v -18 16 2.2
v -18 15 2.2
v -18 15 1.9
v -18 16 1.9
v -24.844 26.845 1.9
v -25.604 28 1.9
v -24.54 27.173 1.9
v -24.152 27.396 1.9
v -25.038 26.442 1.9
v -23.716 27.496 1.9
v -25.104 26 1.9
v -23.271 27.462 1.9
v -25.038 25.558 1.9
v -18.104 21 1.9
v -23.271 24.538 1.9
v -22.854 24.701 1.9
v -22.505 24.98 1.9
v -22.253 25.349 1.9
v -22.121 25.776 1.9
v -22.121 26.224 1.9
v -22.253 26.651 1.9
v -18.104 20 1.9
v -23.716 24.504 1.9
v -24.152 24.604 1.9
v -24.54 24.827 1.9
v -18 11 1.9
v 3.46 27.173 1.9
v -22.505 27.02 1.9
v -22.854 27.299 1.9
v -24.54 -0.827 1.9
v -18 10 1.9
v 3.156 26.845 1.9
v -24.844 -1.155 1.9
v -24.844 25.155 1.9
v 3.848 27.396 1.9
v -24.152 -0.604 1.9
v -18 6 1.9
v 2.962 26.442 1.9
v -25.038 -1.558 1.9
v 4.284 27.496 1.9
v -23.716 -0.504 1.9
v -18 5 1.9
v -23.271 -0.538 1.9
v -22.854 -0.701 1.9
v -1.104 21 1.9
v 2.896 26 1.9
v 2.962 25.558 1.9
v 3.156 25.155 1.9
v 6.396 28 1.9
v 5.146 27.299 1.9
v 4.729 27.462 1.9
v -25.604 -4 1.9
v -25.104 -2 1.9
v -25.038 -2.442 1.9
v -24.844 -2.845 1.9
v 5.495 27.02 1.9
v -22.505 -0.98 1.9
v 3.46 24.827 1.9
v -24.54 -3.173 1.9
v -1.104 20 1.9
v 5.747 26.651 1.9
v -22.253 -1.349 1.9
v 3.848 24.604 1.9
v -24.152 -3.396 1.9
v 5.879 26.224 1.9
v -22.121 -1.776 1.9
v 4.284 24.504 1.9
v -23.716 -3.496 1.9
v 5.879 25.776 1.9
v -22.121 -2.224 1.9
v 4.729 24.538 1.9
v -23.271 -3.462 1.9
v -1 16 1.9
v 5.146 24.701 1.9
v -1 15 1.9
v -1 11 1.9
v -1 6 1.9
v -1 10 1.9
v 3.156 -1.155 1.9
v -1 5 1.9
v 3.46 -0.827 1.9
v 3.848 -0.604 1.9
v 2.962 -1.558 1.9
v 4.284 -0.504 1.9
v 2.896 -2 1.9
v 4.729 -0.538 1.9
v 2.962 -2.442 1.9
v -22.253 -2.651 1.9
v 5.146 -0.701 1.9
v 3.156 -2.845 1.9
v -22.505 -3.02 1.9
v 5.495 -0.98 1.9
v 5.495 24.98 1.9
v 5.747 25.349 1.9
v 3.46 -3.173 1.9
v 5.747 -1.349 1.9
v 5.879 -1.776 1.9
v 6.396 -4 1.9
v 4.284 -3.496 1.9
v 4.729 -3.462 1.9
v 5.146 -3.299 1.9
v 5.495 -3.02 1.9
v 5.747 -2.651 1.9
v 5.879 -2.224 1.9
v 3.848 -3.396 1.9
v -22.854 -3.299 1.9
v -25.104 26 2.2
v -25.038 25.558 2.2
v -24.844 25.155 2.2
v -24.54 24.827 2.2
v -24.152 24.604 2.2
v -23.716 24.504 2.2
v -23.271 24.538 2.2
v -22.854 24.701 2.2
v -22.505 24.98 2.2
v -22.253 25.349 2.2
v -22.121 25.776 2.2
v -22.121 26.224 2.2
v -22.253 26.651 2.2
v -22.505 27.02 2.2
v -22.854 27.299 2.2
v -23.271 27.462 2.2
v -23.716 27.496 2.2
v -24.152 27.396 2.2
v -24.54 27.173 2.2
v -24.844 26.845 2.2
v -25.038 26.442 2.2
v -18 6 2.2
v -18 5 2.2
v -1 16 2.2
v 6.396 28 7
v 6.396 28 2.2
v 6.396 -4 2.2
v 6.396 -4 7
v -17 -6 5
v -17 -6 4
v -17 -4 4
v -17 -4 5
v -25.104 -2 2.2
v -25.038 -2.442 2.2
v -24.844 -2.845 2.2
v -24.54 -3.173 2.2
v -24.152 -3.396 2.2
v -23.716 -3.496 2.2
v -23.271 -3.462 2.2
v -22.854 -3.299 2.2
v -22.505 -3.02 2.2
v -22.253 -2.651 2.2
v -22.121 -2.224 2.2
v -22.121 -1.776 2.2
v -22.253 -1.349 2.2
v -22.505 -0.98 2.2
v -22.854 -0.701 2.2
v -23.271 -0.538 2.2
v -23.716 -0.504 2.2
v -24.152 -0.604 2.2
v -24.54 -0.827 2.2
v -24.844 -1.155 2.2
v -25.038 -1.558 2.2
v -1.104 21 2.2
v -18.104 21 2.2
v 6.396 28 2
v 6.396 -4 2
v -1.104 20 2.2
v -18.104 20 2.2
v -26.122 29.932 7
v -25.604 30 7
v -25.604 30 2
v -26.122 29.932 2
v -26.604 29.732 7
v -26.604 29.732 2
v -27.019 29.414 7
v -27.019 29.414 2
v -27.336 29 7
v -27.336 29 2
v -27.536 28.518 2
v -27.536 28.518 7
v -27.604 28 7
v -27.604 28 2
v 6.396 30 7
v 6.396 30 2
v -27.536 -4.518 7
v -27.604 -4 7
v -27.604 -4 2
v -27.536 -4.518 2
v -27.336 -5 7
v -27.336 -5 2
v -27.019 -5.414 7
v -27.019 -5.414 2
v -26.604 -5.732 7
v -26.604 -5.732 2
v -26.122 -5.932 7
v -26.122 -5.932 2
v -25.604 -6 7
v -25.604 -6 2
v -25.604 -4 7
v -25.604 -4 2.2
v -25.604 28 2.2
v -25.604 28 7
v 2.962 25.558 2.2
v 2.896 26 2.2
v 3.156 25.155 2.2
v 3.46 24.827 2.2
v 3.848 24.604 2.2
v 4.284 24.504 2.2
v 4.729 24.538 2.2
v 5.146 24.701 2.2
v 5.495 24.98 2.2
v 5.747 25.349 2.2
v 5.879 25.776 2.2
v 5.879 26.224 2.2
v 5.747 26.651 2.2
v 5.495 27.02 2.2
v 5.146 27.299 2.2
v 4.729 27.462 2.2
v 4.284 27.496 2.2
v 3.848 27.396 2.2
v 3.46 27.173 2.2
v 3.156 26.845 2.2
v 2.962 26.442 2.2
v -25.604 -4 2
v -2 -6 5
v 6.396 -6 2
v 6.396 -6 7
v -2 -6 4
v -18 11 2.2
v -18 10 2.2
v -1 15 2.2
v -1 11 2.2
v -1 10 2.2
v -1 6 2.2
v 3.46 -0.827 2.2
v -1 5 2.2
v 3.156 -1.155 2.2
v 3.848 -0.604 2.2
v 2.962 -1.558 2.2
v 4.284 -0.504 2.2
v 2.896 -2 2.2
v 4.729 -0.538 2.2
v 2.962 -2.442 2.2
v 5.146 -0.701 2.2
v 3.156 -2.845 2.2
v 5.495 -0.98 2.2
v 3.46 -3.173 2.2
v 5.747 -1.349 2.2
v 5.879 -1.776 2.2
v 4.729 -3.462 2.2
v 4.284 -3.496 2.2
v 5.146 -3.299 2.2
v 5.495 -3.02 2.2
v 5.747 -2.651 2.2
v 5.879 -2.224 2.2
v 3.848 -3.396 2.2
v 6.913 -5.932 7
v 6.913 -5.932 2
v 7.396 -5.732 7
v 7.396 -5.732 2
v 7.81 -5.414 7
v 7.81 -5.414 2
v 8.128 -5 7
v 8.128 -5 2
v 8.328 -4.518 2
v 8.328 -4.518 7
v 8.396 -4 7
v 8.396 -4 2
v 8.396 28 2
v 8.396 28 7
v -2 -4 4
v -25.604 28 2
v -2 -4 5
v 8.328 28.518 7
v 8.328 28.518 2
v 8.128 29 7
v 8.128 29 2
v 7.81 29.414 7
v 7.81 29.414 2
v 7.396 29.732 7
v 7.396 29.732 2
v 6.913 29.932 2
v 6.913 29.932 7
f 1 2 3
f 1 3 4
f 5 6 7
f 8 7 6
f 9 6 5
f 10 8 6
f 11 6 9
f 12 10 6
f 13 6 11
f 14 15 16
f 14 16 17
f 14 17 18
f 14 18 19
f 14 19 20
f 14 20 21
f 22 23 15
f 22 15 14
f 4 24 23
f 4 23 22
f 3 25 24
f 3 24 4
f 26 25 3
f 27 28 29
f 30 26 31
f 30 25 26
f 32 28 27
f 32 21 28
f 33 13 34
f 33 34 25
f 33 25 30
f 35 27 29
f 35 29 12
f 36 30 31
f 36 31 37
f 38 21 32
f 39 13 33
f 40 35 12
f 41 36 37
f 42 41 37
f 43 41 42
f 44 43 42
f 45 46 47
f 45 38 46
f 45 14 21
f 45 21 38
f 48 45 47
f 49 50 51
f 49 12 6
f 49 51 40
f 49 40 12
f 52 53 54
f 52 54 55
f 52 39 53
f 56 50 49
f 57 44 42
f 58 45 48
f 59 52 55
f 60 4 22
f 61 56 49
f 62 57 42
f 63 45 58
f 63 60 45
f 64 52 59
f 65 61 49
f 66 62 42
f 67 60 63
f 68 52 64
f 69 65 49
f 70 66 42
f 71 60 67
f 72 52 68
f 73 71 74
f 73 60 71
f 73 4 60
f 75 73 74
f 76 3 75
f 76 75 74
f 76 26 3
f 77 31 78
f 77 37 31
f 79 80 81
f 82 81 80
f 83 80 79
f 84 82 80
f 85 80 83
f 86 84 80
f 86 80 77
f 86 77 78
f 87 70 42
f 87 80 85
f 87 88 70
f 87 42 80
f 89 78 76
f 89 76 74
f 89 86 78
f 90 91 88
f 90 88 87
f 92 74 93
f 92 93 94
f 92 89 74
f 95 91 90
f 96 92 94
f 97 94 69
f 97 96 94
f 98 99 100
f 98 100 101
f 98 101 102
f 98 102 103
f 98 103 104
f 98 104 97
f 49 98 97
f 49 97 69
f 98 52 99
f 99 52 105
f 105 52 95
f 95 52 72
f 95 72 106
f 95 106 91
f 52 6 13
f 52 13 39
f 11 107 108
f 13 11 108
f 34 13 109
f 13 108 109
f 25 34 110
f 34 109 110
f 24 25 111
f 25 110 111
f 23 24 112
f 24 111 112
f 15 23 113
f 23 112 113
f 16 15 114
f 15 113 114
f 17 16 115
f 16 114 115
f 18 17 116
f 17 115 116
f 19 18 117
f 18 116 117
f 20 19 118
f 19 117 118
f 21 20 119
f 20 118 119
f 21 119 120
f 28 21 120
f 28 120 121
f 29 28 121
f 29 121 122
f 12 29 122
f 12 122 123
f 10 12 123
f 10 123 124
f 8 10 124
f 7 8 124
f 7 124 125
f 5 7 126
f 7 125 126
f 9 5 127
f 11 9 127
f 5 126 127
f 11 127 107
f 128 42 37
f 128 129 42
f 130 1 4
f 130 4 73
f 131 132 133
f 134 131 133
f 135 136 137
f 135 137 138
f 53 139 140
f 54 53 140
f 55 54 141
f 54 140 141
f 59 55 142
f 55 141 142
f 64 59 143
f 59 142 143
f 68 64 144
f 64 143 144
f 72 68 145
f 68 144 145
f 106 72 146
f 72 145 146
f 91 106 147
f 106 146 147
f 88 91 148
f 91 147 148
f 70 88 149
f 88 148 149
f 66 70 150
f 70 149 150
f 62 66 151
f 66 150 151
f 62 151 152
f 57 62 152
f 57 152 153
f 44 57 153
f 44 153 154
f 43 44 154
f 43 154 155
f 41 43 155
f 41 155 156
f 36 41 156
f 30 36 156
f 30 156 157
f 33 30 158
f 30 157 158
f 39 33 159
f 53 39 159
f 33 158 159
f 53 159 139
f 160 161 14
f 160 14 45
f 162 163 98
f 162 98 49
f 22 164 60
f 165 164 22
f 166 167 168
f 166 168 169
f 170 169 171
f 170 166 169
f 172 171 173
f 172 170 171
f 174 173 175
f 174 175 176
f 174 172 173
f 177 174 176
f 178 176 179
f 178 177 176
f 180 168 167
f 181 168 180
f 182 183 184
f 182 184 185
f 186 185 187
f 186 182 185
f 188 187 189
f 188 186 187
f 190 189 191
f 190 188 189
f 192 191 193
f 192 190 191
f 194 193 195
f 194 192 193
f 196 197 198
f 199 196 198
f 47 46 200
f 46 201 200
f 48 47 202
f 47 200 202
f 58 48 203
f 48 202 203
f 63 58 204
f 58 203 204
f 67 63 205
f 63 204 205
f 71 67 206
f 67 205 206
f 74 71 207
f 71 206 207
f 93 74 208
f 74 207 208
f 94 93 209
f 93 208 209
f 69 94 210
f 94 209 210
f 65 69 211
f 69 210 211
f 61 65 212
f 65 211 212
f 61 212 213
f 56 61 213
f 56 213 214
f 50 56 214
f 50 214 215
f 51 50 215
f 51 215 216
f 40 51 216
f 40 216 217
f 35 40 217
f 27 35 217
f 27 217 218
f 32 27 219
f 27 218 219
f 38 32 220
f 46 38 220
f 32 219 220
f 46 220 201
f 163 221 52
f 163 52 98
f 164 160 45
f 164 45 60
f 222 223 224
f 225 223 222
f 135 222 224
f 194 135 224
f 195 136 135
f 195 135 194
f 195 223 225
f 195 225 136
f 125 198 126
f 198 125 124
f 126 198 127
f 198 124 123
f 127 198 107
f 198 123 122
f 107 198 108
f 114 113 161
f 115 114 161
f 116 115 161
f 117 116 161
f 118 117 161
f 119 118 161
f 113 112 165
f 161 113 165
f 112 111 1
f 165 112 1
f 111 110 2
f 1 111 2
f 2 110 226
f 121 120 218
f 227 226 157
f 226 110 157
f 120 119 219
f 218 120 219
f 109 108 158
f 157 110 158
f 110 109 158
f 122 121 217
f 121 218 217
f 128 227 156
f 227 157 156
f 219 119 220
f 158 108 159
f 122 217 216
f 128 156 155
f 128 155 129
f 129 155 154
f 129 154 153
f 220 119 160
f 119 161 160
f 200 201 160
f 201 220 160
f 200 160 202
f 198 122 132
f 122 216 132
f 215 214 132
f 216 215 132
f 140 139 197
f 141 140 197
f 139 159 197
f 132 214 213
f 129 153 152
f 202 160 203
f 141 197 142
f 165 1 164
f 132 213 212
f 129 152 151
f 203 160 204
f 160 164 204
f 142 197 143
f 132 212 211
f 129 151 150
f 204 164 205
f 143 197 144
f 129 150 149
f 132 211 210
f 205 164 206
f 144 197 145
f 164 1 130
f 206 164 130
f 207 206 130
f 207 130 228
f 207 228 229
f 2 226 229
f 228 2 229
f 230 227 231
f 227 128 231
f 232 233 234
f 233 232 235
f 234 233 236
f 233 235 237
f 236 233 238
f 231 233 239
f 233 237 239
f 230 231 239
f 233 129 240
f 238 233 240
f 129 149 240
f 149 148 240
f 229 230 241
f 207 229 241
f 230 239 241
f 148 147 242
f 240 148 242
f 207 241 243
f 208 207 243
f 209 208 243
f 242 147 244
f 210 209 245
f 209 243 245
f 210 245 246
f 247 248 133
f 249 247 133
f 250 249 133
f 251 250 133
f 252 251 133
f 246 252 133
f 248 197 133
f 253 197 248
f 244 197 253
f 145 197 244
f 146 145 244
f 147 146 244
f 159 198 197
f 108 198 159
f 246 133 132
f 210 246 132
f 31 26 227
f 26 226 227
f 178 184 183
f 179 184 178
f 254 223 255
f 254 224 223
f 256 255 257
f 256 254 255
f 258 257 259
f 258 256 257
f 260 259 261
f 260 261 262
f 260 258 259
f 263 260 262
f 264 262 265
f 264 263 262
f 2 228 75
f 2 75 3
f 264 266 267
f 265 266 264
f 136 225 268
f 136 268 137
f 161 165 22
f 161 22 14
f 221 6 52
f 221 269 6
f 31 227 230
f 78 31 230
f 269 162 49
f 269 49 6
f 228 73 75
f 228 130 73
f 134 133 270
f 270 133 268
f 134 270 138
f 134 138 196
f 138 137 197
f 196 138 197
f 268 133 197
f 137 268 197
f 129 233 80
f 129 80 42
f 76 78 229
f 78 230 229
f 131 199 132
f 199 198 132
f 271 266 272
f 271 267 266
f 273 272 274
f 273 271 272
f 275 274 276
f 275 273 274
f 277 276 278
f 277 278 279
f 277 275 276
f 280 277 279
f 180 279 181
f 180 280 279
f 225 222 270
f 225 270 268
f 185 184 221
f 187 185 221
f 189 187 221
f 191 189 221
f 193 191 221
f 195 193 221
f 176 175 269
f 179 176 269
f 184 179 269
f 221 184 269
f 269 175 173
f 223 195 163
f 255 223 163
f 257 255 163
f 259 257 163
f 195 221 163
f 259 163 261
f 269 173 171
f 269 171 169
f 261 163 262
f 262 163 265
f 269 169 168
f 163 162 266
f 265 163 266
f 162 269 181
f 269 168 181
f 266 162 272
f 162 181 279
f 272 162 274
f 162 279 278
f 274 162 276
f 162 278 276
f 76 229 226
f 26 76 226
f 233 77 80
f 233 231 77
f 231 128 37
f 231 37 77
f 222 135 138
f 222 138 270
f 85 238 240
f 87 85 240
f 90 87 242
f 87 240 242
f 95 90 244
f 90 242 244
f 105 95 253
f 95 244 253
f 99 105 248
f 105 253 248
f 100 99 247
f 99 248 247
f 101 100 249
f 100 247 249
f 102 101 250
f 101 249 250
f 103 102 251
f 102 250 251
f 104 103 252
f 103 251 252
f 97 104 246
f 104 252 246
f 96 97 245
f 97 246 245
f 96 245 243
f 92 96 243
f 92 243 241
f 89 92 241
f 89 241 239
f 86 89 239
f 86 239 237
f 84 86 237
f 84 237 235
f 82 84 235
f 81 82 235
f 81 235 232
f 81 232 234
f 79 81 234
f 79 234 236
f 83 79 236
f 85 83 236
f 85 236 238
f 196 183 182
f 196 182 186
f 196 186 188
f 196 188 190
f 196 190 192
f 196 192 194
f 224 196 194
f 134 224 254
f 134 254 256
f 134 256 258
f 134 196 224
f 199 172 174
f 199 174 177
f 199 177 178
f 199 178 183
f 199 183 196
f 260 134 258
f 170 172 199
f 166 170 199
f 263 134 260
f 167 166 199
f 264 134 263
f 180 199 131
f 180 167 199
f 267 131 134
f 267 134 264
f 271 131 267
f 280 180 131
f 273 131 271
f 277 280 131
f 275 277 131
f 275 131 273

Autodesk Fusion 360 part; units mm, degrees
sketch "Sketch1" plane through (0, 0, 0) normal (0, 0, 1) x (1, 0, 0)
  line L0 (-27.6043, 30) -> (8.3957, 30)
  line L1 (8.3957, 30) -> (8.3957, -6)
  line L2 (8.3957, -6) -> (-27.6043, -6)
  line L3 (-27.6043, -6) -> (-27.6043, 30)
  line L4 (-25.6043, 28) -> (6.3957, 28)
  line L5 (6.3957, 28) -> (6.3957, -4)
  line L6 (6.3957, -4) -> (-25.6043, -4)
  line L7 (-25.6043, -4) -> (-25.6043, 28)
  dimension "d1" = 36
  dimension "d2" = 36
  dimension "d3" = 32
  dimension "d4" = 32
  dimension "d5" = 2
  dimension "d6" = 2
extrude "Extrude1" add sketch "Sketch1" along normal blind 5 from surface at 2 makes body 1
sketch "Sketch2" plane through (0, 0, 2) normal (0, 0, -1) x (1, 0, 0)
  line L0 (-25.6043, 4) -> (6.3957, 4)
  line L1 (6.3957, 4) -> (6.3957, -28)
  line L2 (6.3957, -28) -> (-25.6043, -28)
  line L3 (-25.6043, -28) -> (-25.6043, 4)
  line L4 (8.3957, 6) -> (-27.6043, 6)
  line L5 (-27.6043, 6) -> (-27.6043, -30)
  line L6 (-27.6043, -30) -> (8.3957, -30)
  line L7 (8.3957, -30) -> (8.3957, 6)
extrude "Extrude2" add sketch "Sketch2" along normal blind 0.2 separate body contours L0 L1 L2 L3 makes body 2
move_body "Move1" bodies 2 to x (1, 0, 0) y (0, 1, 0) z (0, 0, 1) at (0, 0, 0.2)
fillet "Fillet1" radius 2 1 edges at (-27.6043, 30, 4.5) on bodies 1
fillet "Fillet2" radius 2 1 edges at (-27.6043, -6, 4.5) on bodies 1
fillet "Fillet3" radius 2 1 edges at (8.3957, -6, 4.5) on bodies 1
fillet "Fillet4" radius 2 1 edges at (8.3957, 30, 4.5) on bodies 1
extrude "Extrude3" add 1 faces at (-14.9376, 17.3333, 2) along direction (0, 0, -1) blind 0.1 on bodies 2 bodies 1 2
sketch "Sketch3" plane through (0, 0, 2.2) normal (0, 0, 1) x (-1, 0, 0)
  line L0 (-6.3957, -28) -> (25.6043, -28)
  line L1 (25.6043, -28) -> (25.6043, 4)
  line L2 (25.6043, 4) -> (-6.3957, 4)
  line L3 (-6.3957, 4) -> (-6.3957, -28)
  circle A0 centre (23.6043, 2) radius 1.5
  circle A1 centre (23.6043, 2) radius 2
  circle A2 centre (-4.3957, 2) radius 1.5
  circle A3 centre (-4.3957, 2) radius 2
  circle A4 centre (-4.3957, -26) radius 1.5
  circle A5 centre (-4.3957, -26) radius 2
  circle A6 centre (23.6043, -26) radius 1.5
  circle A7 centre (23.6043, -26) radius 2
  dimension "d22" = 3
  dimension "d23" = 4
  dimension "d24" = 3
  dimension "d25" = 4
  dimension "d26" = 3
  dimension "d27" = 4
  dimension "d28" = 3
  dimension "d29" = 4
extrude "Extrude4" cut sketch "Sketch3" against normal blind 0.4 contours A2 bodies 1
extrude "Extrude5" cut sketch "Sketch3" against normal blind 4 contours A0 bodies 1
extrude "Extrude6" cut sketch "Sketch3" against normal blind 4 contours A6 bodies 1
extrude "Extrude7" cut sketch "Sketch3" against normal blind 4 contours A4 bodies 1
sketch "Sketch4" plane through (0, -6, 0) normal (0, -1, 0) x (1, 0, 0)
  line L0 (6.3957, 2) -> (6.3957, 7)
  line L1 (6.3957, 7) -> (-25.6043, 7)
  line L2 (-25.6043, 7) -> (-25.6043, 2)
  line L3 (-25.6043, 2) -> (6.3957, 2)
  line L4 (-17, 5) -> (-2, 5)
  line L5 (-2, 5) -> (-2, 4)
  line L6 (-2, 4) -> (-17, 4)
  line L7 (-17, 4) -> (-17, 5)
extrude "Extrude8" cut sketch "Sketch4" against normal blind 5 contours L4 L5 L6 L7 bodies 1
sketch "Sketch5" plane through (0, 0, 2.2) normal (0, 0, 1) x (-1, 0, 0)
  circle A0 centre (-4.3957, -26) radius 1.5
  circle A1 centre (23.6043, -26) radius 1.5
  circle A2 centre (23.6043, 2) radius 1.5
  circle A3 centre (-4.3957, 2) radius 1.5
  line L0 (-6.3957, -28) -> (25.6043, -28)
  line L1 (25.6043, -28) -> (25.6043, 4)
  line L2 (25.6043, 4) -> (-6.3957, 4)
  line L3 (-6.3957, 4) -> (-6.3957, -28)
  line L4 (18, -16) -> (1, -16)
  line L5 (1, -16) -> (1, -15)
  line L6 (1, -15) -> (18, -15)
  line L7 (18, -15) -> (18, -16)
  line L8 (1, -11) -> (18, -11)
  line L9 (18, -11) -> (18, -10)
  line L10 (18, -10) -> (1, -10)
  line L11 (1, -10) -> (1, -11)
  line L12 (18, -6) -> (1, -6)
  line L13 (1, -6) -> (1, -5)
  line L14 (1, -5) -> (18, -5)
  line L15 (18, -5) -> (18, -6)
  line L16 (18.1043, -21) -> (1.1043, -21)
  line L17 (1.1043, -21) -> (1.1043, -20)
  line L18 (1.1043, -20) -> (18.1043, -20)
  line L19 (18.1043, -20) -> (18.1043, -21)
  dimension "d40" = 7
  dimension "d41" = 7.5
  dimension "d42" = 4
  dimension "d43" = 4
  dimension "d44" = 4
extrude "Extrude9" cut sketch "Sketch5" against normal blind 5 contours L16 L17 L18 L19 bodies 1
extrude "Extrude10" cut sketch "Sketch5" against normal blind 5 contours L4 L5 L6 L7 | L8 L9 L10 L11 | L12 L13 L14 L15 bodies 1
